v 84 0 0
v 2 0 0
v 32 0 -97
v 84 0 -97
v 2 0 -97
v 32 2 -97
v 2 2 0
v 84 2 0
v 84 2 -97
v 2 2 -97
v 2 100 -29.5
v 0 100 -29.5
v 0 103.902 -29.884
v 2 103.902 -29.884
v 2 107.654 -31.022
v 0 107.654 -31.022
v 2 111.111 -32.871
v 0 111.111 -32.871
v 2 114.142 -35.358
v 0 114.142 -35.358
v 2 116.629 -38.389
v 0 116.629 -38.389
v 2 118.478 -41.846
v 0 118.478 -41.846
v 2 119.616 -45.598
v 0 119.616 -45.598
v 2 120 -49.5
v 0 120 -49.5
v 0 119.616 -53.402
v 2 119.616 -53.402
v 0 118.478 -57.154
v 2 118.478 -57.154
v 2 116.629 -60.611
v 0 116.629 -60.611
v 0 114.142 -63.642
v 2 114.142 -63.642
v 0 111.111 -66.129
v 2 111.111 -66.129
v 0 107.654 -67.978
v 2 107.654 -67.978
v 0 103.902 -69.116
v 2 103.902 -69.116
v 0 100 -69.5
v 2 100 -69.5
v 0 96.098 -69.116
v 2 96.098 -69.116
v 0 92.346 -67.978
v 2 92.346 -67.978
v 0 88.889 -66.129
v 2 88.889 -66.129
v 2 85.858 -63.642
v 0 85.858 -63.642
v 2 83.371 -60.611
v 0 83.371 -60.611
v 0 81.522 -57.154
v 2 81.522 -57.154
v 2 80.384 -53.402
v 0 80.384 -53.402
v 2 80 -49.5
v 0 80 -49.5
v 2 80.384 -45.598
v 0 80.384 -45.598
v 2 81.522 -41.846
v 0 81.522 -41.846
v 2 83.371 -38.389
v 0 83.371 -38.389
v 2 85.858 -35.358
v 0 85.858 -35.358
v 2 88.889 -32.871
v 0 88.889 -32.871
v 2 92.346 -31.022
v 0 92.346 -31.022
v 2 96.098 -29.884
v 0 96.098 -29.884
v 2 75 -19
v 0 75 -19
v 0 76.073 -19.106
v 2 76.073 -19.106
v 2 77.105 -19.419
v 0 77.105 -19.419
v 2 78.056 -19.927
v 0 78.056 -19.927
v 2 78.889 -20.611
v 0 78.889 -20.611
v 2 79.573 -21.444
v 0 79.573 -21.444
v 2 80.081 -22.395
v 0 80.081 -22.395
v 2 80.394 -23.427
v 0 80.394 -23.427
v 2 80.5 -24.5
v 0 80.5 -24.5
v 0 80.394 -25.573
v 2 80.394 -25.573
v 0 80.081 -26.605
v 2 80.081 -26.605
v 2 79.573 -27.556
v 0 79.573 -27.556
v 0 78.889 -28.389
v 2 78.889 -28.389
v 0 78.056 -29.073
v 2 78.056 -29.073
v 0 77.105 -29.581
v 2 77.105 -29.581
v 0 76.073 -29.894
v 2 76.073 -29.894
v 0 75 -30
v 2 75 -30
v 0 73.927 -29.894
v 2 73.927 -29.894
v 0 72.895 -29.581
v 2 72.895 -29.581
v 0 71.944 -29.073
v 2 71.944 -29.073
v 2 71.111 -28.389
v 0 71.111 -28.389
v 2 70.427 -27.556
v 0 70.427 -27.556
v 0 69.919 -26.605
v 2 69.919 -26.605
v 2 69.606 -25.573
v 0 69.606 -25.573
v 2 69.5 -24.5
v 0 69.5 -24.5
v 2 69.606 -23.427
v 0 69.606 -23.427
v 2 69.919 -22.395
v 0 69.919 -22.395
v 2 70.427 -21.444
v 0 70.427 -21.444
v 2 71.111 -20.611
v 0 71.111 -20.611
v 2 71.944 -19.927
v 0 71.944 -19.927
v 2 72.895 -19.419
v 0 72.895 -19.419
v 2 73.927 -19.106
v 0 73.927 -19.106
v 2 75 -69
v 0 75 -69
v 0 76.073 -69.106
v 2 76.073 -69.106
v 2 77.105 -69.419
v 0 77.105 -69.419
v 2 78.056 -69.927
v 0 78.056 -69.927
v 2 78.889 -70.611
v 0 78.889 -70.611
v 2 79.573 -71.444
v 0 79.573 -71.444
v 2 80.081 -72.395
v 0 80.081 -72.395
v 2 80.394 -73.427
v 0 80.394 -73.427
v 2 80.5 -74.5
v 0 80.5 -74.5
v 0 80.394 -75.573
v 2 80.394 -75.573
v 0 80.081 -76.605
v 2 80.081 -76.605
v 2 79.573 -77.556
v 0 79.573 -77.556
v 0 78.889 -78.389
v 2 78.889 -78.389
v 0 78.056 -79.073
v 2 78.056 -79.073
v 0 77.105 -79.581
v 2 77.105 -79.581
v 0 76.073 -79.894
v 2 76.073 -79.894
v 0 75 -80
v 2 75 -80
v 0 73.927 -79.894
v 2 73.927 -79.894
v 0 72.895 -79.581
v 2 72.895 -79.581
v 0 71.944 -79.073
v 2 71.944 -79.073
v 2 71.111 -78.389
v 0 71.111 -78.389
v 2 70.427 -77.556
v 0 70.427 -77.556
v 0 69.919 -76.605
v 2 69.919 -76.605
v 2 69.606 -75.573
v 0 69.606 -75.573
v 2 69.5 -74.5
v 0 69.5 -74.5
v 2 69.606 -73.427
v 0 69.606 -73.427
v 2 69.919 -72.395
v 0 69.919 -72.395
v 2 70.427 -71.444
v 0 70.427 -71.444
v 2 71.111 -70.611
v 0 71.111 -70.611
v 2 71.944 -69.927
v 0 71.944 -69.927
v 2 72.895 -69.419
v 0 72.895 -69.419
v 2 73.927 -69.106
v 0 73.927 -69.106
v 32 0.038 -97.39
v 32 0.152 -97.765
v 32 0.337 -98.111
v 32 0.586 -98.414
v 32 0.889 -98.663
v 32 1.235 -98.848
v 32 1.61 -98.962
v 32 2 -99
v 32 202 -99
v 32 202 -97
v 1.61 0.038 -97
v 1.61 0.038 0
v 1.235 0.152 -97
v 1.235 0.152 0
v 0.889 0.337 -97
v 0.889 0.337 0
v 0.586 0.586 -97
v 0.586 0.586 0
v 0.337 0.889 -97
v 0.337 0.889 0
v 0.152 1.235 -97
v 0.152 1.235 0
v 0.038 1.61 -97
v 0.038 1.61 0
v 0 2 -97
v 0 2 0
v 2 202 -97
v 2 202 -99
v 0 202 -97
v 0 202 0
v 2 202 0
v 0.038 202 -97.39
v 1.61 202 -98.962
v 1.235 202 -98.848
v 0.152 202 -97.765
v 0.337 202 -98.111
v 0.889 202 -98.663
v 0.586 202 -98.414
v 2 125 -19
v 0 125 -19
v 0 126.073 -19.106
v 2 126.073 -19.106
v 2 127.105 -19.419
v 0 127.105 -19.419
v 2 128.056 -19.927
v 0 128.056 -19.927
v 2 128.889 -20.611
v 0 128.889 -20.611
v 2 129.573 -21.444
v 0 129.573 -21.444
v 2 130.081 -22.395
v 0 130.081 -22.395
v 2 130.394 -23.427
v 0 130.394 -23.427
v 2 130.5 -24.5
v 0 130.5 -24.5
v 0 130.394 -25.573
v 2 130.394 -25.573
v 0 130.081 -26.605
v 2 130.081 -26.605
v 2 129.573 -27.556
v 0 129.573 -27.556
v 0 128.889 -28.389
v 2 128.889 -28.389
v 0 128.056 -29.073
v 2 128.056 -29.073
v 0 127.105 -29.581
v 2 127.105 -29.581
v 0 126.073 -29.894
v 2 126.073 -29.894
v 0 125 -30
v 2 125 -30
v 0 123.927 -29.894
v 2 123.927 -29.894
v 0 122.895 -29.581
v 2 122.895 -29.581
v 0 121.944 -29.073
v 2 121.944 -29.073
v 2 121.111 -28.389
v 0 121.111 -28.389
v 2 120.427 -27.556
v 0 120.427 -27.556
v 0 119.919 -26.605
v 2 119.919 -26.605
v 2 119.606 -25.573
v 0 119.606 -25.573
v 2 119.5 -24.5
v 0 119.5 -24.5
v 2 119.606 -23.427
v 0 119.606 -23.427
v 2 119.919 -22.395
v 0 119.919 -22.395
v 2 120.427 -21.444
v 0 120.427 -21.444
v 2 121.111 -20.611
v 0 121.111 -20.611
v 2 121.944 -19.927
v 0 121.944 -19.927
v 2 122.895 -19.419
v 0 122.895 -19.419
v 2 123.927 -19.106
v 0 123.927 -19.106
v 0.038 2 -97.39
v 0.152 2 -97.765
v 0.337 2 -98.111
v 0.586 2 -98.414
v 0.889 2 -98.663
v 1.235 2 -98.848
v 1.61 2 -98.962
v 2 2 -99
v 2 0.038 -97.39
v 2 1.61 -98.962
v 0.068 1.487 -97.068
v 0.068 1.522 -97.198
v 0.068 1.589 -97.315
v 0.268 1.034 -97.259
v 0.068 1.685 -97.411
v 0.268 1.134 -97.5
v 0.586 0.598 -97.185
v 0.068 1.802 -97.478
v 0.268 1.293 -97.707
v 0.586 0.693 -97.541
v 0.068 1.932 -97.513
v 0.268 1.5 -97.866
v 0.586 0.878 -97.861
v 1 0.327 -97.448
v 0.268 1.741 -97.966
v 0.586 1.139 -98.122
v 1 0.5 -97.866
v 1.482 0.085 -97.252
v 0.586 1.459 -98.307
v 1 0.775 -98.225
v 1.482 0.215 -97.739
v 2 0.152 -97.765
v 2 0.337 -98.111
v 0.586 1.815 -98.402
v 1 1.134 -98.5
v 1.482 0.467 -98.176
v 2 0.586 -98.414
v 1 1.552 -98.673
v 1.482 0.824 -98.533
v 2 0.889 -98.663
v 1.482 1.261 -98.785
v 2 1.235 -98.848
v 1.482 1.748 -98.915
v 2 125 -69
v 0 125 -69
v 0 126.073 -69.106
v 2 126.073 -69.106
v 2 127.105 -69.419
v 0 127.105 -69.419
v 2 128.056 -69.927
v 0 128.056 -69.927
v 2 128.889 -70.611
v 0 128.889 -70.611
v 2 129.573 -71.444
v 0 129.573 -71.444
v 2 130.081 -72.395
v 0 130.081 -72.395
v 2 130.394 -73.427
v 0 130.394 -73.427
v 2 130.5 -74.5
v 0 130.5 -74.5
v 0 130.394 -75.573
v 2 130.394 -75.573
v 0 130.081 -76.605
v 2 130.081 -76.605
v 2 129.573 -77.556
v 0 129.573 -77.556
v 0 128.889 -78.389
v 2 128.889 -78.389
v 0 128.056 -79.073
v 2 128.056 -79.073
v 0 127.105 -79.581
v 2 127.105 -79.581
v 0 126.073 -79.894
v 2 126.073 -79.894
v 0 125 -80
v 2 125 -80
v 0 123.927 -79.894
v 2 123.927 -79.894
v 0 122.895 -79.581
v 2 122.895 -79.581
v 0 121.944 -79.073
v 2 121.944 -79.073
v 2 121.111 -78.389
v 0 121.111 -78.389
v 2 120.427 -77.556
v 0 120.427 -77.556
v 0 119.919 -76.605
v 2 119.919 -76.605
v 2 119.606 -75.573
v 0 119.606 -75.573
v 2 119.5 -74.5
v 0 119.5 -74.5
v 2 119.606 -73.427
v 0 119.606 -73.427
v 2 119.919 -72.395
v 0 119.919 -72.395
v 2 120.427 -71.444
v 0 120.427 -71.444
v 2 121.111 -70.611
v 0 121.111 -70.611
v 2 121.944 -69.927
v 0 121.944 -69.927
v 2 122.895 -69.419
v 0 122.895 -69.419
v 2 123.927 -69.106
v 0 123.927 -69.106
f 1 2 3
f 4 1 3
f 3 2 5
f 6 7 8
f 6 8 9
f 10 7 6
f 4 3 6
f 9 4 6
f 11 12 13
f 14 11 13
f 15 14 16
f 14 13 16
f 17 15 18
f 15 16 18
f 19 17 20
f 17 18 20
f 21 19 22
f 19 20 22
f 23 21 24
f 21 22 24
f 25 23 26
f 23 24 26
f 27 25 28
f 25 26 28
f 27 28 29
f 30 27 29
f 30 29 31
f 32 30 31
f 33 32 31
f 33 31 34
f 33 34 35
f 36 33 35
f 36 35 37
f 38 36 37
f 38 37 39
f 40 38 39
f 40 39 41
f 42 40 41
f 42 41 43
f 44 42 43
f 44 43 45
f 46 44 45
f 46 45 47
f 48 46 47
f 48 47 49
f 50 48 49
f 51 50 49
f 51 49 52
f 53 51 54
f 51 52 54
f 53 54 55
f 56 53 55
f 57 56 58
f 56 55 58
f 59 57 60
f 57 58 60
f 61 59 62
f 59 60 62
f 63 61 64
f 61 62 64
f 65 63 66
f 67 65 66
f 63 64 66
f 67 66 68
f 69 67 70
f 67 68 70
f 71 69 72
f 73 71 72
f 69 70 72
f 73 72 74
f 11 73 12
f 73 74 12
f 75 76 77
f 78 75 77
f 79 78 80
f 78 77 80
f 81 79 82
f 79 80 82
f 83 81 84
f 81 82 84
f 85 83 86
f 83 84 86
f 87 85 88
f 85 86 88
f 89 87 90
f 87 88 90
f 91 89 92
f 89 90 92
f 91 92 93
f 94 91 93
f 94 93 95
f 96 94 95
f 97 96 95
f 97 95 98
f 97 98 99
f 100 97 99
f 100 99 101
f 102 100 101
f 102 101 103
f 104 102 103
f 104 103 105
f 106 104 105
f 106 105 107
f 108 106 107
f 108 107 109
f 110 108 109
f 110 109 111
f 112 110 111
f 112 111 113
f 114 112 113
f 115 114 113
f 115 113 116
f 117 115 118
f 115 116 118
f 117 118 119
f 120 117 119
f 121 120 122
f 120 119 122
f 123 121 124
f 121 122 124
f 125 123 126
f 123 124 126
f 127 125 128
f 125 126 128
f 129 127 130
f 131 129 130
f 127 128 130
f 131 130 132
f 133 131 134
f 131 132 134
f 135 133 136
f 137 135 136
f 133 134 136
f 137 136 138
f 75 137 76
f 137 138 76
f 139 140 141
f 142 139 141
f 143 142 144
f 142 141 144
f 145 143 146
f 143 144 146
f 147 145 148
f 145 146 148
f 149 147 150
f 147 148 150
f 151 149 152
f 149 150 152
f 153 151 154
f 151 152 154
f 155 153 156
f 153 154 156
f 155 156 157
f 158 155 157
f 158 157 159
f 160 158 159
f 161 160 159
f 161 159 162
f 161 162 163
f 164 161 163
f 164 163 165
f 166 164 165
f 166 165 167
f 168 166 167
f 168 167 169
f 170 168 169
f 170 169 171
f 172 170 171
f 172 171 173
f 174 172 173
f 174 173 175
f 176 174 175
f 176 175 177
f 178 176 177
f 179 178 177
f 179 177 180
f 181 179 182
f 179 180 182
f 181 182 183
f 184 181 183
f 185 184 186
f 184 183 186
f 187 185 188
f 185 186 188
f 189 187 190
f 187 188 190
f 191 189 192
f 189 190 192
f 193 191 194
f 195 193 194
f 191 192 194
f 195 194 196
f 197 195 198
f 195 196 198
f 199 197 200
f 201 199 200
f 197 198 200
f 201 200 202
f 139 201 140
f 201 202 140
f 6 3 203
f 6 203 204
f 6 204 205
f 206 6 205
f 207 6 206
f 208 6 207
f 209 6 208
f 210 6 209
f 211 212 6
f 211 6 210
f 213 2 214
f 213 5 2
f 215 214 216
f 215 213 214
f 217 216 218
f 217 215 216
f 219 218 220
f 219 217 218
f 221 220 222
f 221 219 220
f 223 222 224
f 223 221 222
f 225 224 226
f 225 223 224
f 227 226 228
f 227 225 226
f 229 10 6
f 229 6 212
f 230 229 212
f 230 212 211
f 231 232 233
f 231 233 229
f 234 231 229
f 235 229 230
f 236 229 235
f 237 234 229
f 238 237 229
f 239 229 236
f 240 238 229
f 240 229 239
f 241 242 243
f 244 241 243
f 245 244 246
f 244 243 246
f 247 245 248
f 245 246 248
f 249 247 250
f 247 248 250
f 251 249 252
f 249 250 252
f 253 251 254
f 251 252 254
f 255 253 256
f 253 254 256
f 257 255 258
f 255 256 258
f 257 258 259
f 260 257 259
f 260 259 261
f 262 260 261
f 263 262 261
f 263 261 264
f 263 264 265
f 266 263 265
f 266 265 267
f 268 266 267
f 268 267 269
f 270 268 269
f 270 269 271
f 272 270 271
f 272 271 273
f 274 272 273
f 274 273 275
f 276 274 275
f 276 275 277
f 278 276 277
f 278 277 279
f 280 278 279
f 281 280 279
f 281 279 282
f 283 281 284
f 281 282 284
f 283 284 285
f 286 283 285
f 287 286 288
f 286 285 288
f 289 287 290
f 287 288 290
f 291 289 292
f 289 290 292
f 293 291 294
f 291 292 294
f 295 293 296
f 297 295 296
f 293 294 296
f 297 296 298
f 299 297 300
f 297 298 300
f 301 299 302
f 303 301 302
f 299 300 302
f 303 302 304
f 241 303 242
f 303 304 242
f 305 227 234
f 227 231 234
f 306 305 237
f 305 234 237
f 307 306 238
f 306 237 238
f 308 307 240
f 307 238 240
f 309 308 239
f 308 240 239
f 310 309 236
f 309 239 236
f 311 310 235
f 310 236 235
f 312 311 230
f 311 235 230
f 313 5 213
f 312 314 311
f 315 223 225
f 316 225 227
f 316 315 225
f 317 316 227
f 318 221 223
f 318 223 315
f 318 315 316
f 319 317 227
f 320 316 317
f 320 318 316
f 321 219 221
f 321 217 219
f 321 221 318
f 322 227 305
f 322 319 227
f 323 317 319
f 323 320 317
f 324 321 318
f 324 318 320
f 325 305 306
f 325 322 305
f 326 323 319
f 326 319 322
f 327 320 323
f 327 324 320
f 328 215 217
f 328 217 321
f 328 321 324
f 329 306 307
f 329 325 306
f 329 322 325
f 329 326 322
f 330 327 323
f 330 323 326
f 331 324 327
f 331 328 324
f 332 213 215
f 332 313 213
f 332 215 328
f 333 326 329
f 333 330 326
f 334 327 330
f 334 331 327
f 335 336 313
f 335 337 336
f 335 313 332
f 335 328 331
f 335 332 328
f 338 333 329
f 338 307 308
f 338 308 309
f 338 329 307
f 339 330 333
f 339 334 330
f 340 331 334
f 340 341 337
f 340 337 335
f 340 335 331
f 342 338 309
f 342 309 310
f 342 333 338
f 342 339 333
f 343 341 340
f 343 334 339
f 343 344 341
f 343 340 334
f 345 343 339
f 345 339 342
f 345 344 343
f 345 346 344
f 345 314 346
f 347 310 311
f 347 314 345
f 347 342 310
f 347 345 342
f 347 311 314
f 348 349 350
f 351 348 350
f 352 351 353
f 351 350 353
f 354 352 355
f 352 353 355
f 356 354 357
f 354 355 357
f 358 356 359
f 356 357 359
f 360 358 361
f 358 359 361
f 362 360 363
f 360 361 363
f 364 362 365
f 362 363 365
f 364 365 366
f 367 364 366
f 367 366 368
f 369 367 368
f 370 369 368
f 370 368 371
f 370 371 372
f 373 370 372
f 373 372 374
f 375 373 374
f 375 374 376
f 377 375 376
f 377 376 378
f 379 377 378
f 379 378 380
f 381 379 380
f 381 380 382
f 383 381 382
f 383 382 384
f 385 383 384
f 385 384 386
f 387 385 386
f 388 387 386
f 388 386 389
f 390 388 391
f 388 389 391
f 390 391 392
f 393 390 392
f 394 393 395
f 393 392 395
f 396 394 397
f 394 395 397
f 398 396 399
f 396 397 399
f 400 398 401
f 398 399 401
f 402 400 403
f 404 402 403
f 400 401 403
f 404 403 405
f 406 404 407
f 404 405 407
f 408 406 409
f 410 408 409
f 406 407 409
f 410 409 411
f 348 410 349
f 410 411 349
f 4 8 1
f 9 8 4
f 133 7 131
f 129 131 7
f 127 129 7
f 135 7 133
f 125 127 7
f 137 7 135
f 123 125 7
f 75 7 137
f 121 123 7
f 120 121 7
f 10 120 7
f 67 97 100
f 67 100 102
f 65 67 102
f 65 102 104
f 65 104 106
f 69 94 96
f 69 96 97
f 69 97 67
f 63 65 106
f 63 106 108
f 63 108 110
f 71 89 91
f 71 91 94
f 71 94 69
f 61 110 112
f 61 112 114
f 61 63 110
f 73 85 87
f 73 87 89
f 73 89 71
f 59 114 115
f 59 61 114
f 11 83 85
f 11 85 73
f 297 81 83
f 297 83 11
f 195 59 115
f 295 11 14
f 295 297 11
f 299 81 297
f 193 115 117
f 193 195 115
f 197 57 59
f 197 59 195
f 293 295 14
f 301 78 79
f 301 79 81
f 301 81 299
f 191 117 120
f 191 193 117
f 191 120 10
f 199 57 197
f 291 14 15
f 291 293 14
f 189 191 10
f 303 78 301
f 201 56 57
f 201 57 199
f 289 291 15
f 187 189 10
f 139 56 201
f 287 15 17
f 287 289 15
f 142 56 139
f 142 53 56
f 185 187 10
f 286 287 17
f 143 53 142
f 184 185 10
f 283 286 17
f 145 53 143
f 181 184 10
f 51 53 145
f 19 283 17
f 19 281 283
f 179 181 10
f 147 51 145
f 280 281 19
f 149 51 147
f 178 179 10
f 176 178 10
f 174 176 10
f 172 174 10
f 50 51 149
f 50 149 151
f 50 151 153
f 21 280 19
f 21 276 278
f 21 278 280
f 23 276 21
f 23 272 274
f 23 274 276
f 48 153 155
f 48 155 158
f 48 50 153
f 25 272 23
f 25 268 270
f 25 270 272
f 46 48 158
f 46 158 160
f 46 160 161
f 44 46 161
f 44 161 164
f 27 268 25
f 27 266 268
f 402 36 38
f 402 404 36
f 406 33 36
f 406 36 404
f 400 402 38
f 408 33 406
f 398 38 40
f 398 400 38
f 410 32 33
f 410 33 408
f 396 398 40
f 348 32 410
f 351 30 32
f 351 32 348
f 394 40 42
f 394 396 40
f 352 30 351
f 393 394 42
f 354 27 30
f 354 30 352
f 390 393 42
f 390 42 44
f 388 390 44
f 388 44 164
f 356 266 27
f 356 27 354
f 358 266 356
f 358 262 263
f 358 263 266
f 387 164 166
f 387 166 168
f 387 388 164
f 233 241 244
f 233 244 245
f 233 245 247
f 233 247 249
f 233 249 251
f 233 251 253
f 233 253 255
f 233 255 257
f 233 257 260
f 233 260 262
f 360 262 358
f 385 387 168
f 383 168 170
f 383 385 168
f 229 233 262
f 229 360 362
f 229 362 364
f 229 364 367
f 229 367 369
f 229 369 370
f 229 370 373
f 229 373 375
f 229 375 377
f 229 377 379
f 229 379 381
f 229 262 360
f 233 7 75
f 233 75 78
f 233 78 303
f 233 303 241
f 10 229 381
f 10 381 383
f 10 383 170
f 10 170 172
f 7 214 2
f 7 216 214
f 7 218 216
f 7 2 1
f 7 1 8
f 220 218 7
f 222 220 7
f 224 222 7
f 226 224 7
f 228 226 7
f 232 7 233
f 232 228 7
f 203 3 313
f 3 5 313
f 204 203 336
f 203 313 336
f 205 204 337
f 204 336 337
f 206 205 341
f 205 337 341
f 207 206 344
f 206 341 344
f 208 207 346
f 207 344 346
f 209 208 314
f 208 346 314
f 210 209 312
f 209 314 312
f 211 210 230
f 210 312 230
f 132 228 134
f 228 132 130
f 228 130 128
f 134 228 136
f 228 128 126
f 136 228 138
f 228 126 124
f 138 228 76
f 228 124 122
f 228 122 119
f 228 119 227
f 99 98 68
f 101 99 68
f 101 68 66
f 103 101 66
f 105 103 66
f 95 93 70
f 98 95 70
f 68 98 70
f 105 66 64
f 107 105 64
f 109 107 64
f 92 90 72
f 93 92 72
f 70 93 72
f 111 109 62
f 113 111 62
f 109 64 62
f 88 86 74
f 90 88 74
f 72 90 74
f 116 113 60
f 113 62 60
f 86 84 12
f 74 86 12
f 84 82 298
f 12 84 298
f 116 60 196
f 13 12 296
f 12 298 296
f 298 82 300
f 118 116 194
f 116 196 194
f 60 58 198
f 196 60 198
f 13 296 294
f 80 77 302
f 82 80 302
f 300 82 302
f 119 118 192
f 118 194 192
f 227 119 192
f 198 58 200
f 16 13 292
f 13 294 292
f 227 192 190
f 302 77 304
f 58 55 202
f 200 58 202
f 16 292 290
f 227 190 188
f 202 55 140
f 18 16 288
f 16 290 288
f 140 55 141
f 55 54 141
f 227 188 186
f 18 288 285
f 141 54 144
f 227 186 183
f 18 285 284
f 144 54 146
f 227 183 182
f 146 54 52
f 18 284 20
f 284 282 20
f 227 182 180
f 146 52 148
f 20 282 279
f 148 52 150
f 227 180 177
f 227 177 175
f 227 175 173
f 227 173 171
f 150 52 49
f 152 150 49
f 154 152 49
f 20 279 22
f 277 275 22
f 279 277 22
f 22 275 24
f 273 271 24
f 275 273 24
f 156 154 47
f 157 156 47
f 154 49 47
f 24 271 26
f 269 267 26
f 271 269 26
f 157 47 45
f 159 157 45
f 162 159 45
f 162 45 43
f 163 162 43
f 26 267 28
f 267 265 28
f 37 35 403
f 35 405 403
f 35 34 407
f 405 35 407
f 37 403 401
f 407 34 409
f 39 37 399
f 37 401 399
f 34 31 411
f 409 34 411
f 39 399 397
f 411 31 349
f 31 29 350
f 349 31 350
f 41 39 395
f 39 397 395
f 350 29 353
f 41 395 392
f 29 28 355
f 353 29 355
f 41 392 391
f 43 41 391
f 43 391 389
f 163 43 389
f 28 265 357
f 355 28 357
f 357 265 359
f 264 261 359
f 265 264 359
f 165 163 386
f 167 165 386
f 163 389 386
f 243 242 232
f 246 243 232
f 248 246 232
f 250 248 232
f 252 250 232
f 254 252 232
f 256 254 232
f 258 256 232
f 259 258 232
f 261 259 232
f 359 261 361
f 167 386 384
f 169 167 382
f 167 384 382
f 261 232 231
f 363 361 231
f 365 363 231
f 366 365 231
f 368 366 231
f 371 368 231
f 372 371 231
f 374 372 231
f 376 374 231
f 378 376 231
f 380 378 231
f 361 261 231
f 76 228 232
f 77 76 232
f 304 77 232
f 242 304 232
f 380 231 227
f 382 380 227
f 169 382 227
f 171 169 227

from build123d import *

# Parameters (mm, degrees)
SKETCH1_W           = 99
SKETCH1_H           = 202
BOSS_EXTRUDE1_DEPTH = 2
SKETCH2_W           = 97
SKETCH2_H           = 2
BOSS_EXTRUDE2_DEPTH = 82
SKETCH3_W           = 2
SKETCH3_H           = 202
BOSS_EXTRUDE3_DEPTH = 30
FILLET1_R           = 2
SKETCH5_R           = 20
SKETCH5_R_2         = 5.5
CUT_EXTRUDE1_DEPTH  = 41


with BuildPart() as part:
    # Sketch1 → Boss-Extrude1 (new body)
    with BuildSketch(Plane(origin=(0, 0, 0), x_dir=(0, 0, -1), z_dir=(1, 0, 0))):
        with Locations((49.5, 101)):
            Rectangle(SKETCH1_W, SKETCH1_H)
    extrude(amount=BOSS_EXTRUDE1_DEPTH)

    # Sketch2 → Boss-Extrude2 (add)
    with BuildSketch(Plane(origin=(2, 0, 0), x_dir=(0, 0, -1), z_dir=(1, 0, 0))):
        with Locations((48.5, 1)):
            Rectangle(SKETCH2_W, SKETCH2_H)
    extrude(amount=BOSS_EXTRUDE2_DEPTH)

    # Sketch3 → Boss-Extrude3 (add)
    with BuildSketch(Plane(origin=(2, 0, 0), x_dir=(0, 0, -1), z_dir=(1, 0, 0))):
        with Locations((98, 101)):
            Rectangle(SKETCH3_W, SKETCH3_H)
    extrude(amount=BOSS_EXTRUDE3_DEPTH)

    # Fillet1
    fillet1_edges = [part.edges().sort_by_distance(p)[0] for p in [
        (16, 0, -99),
        (0, 0, -49.5),
        (0, 101, -99),
    ]]
    fillet(fillet1_edges, radius=FILLET1_R)

    # Sketch5 → Cut-Extrude1 (cut)
    with BuildSketch(Plane.ZY):
        with Locations((-49.5, 100)):
            Circle(SKETCH5_R)
        with Locations((-24.5, 125)):
            Circle(SKETCH5_R_2)
        with Locations((-74.5, 125)):
            Circle(SKETCH5_R_2)
        with Locations((-24.5, 75)):
            Circle(SKETCH5_R_2)
        with Locations((-74.5, 75)):
            Circle(SKETCH5_R_2)
    extrude(amount=-CUT_EXTRUDE1_DEPTH, mode=Mode.SUBTRACT)


solid = part.part
